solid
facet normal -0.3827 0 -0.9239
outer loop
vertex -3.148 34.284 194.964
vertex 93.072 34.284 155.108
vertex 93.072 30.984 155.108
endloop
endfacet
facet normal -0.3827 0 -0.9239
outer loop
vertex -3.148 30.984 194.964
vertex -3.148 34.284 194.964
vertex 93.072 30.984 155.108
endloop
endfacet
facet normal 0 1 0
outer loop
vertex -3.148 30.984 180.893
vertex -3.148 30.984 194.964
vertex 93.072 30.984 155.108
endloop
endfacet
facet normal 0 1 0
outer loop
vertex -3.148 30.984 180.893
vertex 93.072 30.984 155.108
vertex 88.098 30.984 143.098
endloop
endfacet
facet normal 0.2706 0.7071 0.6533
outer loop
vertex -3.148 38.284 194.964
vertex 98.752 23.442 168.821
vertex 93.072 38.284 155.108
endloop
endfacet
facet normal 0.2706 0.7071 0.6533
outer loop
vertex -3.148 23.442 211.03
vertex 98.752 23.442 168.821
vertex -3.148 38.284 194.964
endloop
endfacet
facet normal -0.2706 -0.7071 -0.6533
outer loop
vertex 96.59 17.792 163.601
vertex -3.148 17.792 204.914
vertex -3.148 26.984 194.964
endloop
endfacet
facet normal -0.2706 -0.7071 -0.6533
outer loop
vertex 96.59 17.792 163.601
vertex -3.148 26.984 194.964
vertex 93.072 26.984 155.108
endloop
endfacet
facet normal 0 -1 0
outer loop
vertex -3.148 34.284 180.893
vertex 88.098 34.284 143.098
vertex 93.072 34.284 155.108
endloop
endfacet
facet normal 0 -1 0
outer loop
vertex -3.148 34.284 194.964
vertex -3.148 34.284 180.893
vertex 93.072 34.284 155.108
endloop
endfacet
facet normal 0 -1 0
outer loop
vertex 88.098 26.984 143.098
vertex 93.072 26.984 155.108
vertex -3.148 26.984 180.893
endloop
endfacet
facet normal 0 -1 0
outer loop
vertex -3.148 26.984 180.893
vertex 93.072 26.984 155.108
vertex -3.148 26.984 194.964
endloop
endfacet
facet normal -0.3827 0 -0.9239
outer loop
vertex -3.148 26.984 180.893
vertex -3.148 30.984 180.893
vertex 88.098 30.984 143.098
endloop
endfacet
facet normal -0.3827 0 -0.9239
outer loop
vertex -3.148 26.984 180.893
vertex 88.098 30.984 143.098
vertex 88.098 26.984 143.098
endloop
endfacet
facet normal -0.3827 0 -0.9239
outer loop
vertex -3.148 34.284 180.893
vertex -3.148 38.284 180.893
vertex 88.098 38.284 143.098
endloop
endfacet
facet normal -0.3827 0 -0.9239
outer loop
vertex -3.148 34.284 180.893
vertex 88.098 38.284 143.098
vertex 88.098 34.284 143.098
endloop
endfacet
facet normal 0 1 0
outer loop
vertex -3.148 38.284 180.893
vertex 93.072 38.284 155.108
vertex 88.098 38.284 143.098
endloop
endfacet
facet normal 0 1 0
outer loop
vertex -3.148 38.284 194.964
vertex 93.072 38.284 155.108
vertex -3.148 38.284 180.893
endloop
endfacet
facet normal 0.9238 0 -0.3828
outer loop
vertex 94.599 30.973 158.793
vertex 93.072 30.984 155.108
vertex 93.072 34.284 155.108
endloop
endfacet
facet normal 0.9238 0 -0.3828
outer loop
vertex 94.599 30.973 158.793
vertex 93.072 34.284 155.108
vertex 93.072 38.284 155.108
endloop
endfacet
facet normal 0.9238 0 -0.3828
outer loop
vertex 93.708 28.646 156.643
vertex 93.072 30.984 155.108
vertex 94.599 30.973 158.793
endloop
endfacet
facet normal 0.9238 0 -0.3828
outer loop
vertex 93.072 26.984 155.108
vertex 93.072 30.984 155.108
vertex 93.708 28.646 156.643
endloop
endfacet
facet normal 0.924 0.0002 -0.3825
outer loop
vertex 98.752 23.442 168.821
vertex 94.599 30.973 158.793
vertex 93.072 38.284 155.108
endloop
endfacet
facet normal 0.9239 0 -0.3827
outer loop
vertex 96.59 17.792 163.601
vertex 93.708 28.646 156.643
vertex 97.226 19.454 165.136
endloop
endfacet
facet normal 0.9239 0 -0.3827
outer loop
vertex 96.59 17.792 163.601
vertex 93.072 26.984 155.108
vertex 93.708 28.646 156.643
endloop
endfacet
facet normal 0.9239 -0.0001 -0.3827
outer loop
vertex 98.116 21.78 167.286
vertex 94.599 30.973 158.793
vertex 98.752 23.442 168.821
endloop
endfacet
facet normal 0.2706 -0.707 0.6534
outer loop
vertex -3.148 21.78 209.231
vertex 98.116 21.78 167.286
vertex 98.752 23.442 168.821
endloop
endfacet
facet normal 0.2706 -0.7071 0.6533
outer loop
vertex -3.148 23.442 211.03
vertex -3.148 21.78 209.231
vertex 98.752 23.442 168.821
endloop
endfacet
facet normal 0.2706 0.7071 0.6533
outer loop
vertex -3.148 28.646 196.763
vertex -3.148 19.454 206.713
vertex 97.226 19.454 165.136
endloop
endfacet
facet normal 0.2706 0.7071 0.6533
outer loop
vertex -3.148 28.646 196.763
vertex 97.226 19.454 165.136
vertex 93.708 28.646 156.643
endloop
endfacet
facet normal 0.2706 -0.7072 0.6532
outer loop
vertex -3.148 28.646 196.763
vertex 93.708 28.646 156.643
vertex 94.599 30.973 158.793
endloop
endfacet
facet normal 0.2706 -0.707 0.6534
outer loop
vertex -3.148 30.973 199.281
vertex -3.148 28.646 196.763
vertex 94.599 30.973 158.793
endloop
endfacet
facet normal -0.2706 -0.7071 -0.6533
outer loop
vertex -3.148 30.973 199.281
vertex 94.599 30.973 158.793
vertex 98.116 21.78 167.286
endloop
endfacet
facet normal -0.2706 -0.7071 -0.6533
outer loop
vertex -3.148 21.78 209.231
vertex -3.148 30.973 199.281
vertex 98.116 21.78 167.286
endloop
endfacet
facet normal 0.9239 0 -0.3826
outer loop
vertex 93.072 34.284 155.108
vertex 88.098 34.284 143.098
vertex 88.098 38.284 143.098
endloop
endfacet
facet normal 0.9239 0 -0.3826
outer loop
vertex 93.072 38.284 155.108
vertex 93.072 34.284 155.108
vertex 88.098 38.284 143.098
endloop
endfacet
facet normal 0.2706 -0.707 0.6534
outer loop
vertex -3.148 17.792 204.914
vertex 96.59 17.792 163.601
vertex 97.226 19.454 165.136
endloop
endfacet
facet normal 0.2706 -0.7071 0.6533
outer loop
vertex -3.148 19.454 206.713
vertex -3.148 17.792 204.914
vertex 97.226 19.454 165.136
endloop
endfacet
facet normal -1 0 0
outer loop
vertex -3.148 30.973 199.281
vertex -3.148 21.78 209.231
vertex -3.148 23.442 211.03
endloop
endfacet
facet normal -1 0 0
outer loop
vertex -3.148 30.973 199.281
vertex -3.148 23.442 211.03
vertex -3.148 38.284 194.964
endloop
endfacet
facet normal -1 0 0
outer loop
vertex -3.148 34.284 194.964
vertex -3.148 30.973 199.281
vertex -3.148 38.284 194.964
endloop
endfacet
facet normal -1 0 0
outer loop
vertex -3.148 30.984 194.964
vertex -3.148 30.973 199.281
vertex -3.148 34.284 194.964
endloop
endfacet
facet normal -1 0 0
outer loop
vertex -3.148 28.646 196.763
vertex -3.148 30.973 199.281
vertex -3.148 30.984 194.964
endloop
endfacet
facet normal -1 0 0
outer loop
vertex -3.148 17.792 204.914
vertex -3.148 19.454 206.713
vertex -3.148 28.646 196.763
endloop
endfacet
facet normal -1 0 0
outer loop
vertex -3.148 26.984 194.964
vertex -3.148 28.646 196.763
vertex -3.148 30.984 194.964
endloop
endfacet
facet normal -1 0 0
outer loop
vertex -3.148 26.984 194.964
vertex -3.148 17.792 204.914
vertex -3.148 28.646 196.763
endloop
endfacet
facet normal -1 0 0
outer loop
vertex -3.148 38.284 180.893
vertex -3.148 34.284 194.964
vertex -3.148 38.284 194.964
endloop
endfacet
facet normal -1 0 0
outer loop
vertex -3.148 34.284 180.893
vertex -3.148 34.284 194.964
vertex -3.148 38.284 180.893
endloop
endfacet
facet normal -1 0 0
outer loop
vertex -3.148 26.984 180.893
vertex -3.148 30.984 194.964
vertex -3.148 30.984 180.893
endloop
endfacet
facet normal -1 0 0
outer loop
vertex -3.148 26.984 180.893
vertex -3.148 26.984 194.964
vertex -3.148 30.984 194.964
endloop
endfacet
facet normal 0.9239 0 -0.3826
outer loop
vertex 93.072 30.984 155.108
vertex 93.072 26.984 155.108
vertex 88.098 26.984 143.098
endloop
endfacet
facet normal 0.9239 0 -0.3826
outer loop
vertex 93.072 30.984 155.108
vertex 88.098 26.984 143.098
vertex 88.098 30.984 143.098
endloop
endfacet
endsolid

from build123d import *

# Parameters (mm, degrees)
SKETCH1_W           = 214.089522673
SKETCH1_H           = 271.033566845
BOSS_EXTRUDE1_DEPTH = 10
SKETCH3_W           = 107.044761337
SKETCH3_H           = 271.033566845
CUT_EXTRUDE1_DEPTH  = 252.253590179
CUT_EXTRUDE2_DEPTH  = 249.55642867
BOSS_EXTRUDE3_DEPTH = 40
CUT_EXTRUDE3_START  = -165.689856025
CUT_EXTRUDE3_DEPTH  = 205.862728092
CUT_EXTRUDE4_DEPTH  = 250.960593361
CUT_EXTRUDE5_DEPTH  = 250.960593361
CUT_EXTRUDE11_DEPTH = 252.67545035
SKETCH26_W          = 104.148686
SKETCH26_H          = 11.3
BOSS_EXTRUDE7_DEPTH = 45
CUT_EXTRUDE12_DEPTH = 250.816831154
CUT_EXTRUDE13_DEPTH = 252.67545035
CUT_EXTRUDE14_DEPTH = 237.436663672


with BuildPart() as part:
    # Sketch1 → Boss-Extrude1 (new body)
    with BuildSketch(Plane(origin=(0, 0, 0), x_dir=(1, 0, 0), z_dir=(0, 1, 0))):
        with Locations((-3.148375333, -90.062114546)):
            Rectangle(SKETCH1_W, SKETCH1_H)
    extrude(amount=BOSS_EXTRUDE1_DEPTH)

    # Sketch3 → Cut-Extrude1 (cut, through all)
    with BuildSketch(Plane(origin=(0, 10, 0), x_dir=(1, 0, 0), z_dir=(0, 1, 0))):
        with Locations((-56.670756002, -90.062114546)):
            Rectangle(SKETCH3_W, SKETCH3_H)
    extrude(amount=-CUT_EXTRUDE1_DEPTH, mode=Mode.SUBTRACT)

    # Sketch4 → Cut-Extrude2 (cut, through all)
    with BuildSketch(Plane(origin=(0, 10, 0), x_dir=(1, 0, 0), z_dir=(0, 1, 0))):
        Polygon((103.896386003, -181.239506042), (100.834918545, -173.848469781), (9.996584241, 45.454668877), (103.896386003, 45.454668877), align=None)
    extrude(amount=-CUT_EXTRUDE2_DEPTH, mode=Mode.SUBTRACT)

    # Sketch6 → Boss-Extrude3 (add, along a direction that is not the sketch's normal)
    with BuildSketch(Plane(origin=(0, 10, 0), x_dir=(1, 0, 0), z_dir=(0, 1, 0))):
        Polygon((99.572063218, -170.799667324), (103.896386003, -181.239506042), (-3.148375333, -225.578897968), (-3.148375333, -213.347866105), align=None)
    extrude(amount=BOSS_EXTRUDE3_DEPTH, dir=(-0.2705980500730979, 0.7071067811865489, -0.6532814824381872))

    # Cut-Extrude3: read off the stored shape, not the designer's step
    # Cut-Extrude3 outline → Cut-Extrude3 (cut)
    with BuildSketch(Plane(origin=(0, 0, 0), x_dir=(1, 0, 0), z_dir=(0, 0.6785983445458481, -0.7345095552677544)).offset(CUT_EXTRUDE3_START)):
        Polygon((-3.148375333, -165), (-3.148375333, -152.122604304), (-13.972297336, -155.165042499), (-15, -155.45391393), (-15, -165), align=None)
    extrude(amount=CUT_EXTRUDE3_DEPTH, mode=Mode.SUBTRACT)

    # Sketch8 → Cut-Extrude4 (cut, through all)
    with BuildSketch(Plane(origin=(0, 10, 0), x_dir=(1, 0, 0), z_dir=(0, 1, 0))):
        Polygon((-3.148375333, -225.578897968), (103.896386003, -181.239506042), (103.896386003, -225.578897968), align=None)
    extrude(amount=-CUT_EXTRUDE4_DEPTH, mode=Mode.SUBTRACT)

    # Sketch9 → Cut-Extrude5 (cut, through all)
    with BuildSketch(Plane(origin=(0, 10, 0), x_dir=(1, 0, 0), z_dir=(0, 1, 0))):
        Polygon((-3.148375333, -213.347866105), (99.572063218, -170.799667324), (9.996584241, 45.454668877), (-3.148375333, 45.454668877), align=None)
    extrude(amount=-CUT_EXTRUDE5_DEPTH, mode=Mode.SUBTRACT)

    # Sketch25 → Cut-Extrude11 (cut, through all)
    with BuildSketch(Plane(origin=(24.603270673, 0, -10.191008392), x_dir=(-0.38268343236508967, 0, -0.9238795325112868), z_dir=(0.9238795325112867, 0, -0.3826834323650896))):
        Polygon((-178.918624473, 38.284271247), (-178.918624473, 26.984271247), (-167.618624473, 38.284271247), align=None)
    extrude(amount=-CUT_EXTRUDE11_DEPTH, mode=Mode.SUBTRACT)

    # Sketch26 → Boss-Extrude7 (add)
    with BuildSketch(Plane(origin=(68.469193327, 0, 165.299255136), x_dir=(-0.9238795325112868, 0, 0.3826834323650896), z_dir=(-0.38268343236508956, 0, -0.9238795325112867))):
        with Locations((25.443954722, 32.634271247)):
            Rectangle(SKETCH26_W, SKETCH26_H)
    extrude(amount=BOSS_EXTRUDE7_DEPTH)

    # Sketch27 → Cut-Extrude12 (cut, through all)
    with BuildSketch(Plane.XZ.offset(-26.984271247)):
        Polygon((-3.148375333, 194.964223379), (-3.148375333, 146.256574366), (-20.36912979, 153.389644416), align=None)
    extrude(amount=-CUT_EXTRUDE12_DEPTH, mode=Mode.SUBTRACT)

    # Sketch29 → Cut-Extrude13 (cut, through all)
    with BuildSketch(Plane(origin=(24.603270673, 0, -10.191008392), x_dir=(-0.38268343236508967, 0, -0.9238795325112868), z_dir=(0.9238795325112867, 0, -0.3826834323650896))):
        Polygon((-188.111012628, 17.791883092), (-189.772713564, 19.453584028), (-180.580325409, 28.645972183), (-182.906923537, 30.972570312), (-192.099311693, 21.780182156), (-193.761012628, 23.441883092), (-207.20289572, 10), (-207.20289572, 0), (-195.90289572, 0), (-195.90289572, 10), align=None)
    extrude(amount=-CUT_EXTRUDE13_DEPTH, mode=Mode.SUBTRACT)

    # Sketch31 → Cut-Extrude14 (cut, through all)
    with BuildSketch(Plane(origin=(24.603270673, 0, -10.191008392), x_dir=(-0.38268343236508967, 0, -0.9238795325112868), z_dir=(0.9238795325112867, 0, -0.3826834323650896))):
        Polygon((-133.918624473, 38.284271247), (-165.918624473, 38.284271247), (-165.918624473, 34.284271247), (-178.918624473, 34.284271247), (-178.918624473, 30.984271247), (-165.918624473, 30.984271247), (-165.918624473, 26.984271247), (-133.918624473, 26.984271247), align=None)
    extrude(amount=-CUT_EXTRUDE14_DEPTH, mode=Mode.SUBTRACT)


solid = part.part
